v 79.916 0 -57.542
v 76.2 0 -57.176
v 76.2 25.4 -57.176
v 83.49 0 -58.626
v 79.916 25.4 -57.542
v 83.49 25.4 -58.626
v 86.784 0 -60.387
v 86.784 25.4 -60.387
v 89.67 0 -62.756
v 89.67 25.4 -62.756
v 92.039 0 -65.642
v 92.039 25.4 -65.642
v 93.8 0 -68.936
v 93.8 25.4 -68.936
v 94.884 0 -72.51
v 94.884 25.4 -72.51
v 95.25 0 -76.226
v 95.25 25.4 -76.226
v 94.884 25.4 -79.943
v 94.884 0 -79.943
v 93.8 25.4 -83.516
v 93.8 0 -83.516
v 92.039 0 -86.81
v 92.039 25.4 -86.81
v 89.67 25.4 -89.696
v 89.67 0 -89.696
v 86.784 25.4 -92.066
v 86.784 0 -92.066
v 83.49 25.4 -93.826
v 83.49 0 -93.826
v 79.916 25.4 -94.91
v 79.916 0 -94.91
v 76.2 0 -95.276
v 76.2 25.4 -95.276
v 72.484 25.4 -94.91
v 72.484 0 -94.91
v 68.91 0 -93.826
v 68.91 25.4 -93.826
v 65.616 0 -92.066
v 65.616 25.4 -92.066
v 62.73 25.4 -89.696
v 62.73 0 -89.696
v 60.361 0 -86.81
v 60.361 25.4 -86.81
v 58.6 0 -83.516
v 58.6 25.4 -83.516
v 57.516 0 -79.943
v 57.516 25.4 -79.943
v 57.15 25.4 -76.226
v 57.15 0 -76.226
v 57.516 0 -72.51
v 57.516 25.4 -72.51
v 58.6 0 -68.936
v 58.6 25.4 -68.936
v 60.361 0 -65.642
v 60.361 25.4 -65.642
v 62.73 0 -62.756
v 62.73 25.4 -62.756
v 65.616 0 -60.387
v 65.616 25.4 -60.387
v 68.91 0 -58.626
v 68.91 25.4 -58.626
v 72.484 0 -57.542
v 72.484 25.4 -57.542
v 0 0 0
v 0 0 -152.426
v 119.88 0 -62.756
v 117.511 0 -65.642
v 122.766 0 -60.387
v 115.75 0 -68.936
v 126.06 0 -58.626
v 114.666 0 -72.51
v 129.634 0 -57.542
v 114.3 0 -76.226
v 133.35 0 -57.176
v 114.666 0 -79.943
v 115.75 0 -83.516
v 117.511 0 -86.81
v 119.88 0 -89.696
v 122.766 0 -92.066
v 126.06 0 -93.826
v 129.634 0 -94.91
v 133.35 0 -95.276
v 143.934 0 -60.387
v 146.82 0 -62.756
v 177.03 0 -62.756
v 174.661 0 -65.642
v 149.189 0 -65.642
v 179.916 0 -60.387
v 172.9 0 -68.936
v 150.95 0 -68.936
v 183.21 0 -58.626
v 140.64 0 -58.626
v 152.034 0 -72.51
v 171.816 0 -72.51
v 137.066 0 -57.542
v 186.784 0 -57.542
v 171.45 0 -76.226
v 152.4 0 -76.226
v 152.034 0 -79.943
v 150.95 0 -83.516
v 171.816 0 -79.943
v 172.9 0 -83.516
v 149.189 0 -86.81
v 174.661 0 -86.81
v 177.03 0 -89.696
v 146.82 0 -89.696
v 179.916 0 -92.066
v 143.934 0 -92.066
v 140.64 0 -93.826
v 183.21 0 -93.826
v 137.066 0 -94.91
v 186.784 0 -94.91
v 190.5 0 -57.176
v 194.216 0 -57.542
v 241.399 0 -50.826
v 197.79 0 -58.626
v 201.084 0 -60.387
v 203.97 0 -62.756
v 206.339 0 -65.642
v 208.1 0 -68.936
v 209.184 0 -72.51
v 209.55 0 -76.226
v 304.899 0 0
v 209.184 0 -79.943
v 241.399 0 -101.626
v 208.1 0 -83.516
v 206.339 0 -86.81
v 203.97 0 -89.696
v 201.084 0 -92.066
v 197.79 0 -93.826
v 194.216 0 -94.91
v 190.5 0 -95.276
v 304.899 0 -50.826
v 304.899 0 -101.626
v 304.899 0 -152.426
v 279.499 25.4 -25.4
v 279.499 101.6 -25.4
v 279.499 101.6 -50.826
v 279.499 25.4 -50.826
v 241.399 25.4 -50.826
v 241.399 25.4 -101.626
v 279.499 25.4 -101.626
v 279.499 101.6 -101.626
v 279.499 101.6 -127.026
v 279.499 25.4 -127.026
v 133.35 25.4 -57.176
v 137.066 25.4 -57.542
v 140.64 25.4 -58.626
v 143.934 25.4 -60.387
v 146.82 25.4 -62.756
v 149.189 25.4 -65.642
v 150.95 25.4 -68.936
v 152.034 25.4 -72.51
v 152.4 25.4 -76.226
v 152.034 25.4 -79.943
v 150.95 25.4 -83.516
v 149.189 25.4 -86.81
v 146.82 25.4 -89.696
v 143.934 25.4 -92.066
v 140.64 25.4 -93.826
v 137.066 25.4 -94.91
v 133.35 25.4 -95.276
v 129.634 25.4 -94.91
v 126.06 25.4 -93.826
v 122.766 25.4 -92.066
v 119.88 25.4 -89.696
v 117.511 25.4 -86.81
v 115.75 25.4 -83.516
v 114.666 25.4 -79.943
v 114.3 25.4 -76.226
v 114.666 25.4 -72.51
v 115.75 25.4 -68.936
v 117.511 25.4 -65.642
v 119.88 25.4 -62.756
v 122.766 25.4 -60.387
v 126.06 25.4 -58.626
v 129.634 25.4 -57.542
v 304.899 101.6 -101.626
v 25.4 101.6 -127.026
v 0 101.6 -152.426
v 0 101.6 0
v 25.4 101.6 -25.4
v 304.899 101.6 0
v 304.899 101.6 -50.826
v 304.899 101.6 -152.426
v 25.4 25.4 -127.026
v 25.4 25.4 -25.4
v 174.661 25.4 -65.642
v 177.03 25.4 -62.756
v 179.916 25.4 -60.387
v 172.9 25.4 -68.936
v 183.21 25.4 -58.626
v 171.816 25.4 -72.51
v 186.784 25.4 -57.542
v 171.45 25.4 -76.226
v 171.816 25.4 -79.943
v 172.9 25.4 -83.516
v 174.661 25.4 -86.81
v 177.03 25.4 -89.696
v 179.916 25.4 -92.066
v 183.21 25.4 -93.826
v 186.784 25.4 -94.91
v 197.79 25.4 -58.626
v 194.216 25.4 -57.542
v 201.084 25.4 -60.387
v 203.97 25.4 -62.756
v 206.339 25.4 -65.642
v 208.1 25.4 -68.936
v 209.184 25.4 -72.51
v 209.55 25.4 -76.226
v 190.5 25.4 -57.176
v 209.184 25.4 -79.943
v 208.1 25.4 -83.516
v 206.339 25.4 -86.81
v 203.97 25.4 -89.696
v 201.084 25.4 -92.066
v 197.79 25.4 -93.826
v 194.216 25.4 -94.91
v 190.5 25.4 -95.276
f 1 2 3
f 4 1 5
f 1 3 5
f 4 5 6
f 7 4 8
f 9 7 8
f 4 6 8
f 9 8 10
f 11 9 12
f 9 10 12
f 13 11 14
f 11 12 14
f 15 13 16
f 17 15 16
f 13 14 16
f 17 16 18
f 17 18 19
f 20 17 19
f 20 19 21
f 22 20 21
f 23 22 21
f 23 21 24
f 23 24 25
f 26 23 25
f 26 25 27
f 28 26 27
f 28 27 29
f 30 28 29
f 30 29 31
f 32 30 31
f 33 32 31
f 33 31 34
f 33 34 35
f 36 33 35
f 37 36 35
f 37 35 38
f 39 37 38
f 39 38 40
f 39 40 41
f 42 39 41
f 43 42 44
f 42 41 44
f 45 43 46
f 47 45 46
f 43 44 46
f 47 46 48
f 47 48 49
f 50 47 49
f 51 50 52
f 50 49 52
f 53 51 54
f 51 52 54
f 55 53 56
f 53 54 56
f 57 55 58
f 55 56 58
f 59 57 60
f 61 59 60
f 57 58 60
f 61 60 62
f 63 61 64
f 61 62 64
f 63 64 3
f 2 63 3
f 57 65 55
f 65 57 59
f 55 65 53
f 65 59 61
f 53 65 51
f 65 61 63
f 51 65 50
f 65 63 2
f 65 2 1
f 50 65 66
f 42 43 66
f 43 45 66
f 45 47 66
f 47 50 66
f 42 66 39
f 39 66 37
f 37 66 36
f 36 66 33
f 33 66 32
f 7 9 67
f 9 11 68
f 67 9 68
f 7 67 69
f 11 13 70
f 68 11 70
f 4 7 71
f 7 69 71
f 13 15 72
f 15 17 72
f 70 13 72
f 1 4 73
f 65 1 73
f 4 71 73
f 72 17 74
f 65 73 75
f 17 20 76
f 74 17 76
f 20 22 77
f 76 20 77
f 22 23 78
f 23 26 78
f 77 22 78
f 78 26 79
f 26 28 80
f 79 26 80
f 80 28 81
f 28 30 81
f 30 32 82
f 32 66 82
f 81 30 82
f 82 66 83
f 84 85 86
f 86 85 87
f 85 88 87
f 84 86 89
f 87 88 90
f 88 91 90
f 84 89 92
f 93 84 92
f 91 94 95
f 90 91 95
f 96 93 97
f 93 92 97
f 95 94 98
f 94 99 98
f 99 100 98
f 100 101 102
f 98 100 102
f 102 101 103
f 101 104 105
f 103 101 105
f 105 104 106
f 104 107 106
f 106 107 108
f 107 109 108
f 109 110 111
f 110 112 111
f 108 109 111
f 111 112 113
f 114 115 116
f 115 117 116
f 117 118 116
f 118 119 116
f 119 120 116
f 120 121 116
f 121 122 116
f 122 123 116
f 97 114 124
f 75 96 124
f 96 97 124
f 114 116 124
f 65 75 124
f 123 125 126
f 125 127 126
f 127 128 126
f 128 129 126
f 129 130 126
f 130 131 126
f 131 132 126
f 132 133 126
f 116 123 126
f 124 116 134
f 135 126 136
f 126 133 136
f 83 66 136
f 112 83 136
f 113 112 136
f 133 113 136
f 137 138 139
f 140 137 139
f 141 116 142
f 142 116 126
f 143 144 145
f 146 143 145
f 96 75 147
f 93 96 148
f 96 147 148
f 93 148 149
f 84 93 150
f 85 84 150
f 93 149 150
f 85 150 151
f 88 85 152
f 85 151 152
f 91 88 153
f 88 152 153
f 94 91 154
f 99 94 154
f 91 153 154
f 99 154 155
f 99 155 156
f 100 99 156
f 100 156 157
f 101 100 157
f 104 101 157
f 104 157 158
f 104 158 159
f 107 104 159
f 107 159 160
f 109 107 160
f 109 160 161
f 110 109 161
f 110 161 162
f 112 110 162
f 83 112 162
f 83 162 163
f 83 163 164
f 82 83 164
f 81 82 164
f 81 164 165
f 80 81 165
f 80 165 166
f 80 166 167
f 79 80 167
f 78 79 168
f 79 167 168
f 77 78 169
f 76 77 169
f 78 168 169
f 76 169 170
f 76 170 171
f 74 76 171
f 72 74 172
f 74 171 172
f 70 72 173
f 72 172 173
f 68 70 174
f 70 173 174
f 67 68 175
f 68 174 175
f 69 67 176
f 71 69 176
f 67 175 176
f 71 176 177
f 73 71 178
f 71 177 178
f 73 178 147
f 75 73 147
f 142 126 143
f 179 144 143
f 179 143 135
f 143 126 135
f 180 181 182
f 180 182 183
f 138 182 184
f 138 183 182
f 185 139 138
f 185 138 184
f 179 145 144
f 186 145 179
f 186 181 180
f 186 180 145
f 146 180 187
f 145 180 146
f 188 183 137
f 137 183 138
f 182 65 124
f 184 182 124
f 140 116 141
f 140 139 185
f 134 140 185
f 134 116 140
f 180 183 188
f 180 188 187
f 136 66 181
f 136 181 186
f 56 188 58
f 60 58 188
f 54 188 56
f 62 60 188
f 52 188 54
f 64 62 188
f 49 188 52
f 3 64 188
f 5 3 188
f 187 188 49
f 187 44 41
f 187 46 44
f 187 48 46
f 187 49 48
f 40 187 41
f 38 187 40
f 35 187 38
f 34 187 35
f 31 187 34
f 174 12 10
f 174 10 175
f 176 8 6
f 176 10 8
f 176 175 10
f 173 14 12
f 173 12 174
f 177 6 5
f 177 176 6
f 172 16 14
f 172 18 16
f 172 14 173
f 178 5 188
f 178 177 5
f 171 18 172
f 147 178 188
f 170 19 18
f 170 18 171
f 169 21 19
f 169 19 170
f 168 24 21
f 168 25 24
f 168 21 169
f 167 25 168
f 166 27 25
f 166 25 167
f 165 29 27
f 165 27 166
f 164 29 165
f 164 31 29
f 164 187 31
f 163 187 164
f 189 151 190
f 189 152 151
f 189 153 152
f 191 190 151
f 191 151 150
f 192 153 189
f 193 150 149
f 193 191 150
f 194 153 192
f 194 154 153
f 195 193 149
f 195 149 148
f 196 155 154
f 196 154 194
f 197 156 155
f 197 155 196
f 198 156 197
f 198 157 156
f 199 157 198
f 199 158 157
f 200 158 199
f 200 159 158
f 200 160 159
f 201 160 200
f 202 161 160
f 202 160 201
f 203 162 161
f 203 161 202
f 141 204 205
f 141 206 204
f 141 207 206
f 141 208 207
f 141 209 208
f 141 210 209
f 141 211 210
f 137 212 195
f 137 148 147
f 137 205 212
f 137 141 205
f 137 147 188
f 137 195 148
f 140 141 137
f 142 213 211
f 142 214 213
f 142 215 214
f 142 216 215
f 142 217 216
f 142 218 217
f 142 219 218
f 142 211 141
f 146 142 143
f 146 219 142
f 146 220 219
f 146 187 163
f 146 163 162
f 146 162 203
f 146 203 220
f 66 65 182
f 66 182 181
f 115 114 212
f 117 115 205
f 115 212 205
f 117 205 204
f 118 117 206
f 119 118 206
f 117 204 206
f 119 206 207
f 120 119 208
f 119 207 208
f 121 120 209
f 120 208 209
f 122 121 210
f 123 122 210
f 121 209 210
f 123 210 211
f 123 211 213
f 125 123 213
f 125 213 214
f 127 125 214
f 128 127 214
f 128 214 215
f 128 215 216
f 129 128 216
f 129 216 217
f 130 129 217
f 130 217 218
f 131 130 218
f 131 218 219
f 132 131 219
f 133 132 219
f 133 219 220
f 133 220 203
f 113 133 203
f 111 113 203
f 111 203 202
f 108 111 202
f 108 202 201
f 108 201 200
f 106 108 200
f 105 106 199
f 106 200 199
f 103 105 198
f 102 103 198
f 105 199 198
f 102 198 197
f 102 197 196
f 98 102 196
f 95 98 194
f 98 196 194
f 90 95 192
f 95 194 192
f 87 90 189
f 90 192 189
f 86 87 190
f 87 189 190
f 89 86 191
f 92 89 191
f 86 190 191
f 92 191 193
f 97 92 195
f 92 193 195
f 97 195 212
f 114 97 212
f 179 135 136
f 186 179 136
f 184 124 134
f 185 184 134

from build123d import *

# Parameters (mm, degrees)
SKETCH3_W           = 304.898736347
SKETCH3_H           = 152.426093062
BOSS_EXTRUDE1_DEPTH = 101.6
SKETCH4_W           = 63.5
SKETCH4_H           = 50.8
CUT_EXTRUDE1_DEPTH  = 147.32
SKETCH5_W           = 254.098736347
SKETCH5_H           = 101.626093062
SKETCH5_R           = 19.05
CUT_EXTRUDE2_DEPTH  = 76.2
CUT_EXTRUDE3_START  = 138.938
SKETCH7_R           = 19.05
CUT_EXTRUDE3_DEPTH  = 138.938


with BuildPart() as part:
    # Sketch3 → Boss-Extrude1 (new body)
    with BuildSketch(Plane(origin=(0, 0, 0), x_dir=(1, 0, 0), z_dir=(0, 1, 0))):
        with Locations((152.449368174, 76.213046531)):
            Rectangle(SKETCH3_W, SKETCH3_H)
    extrude(amount=BOSS_EXTRUDE1_DEPTH)

    # Sketch4 → Cut-Extrude1 (cut)
    with BuildSketch(Plane(origin=(0, 0, 0), x_dir=(1, 0, 0), z_dir=(0, 1, 0))):
        with Locations((273.148736347, 76.226093062)):
            Rectangle(SKETCH4_W, SKETCH4_H)
    extrude(amount=CUT_EXTRUDE1_DEPTH, mode=Mode.SUBTRACT)

    # Sketch5 → Cut-Extrude2 (cut)
    with BuildSketch(Plane(origin=(0, 101.6, 0), x_dir=(1, 0, 0), z_dir=(0, 1, 0))):
        with Locations((152.449368174, 76.213046531)):
            Rectangle(SKETCH5_W, SKETCH5_H)
        with Locations(Location((76.2, 76.226093062, 0), (0, 0, 270))):
            Circle(SKETCH5_R, mode=Mode.SUBTRACT)
        with Locations(Location((133.35, 76.226093062, 0), (0, 0, 270))):
            Circle(SKETCH5_R, mode=Mode.SUBTRACT)
        with Locations(Location((190.5, 76.226093062, 0), (0, 0, 270))):
            Circle(SKETCH5_R, mode=Mode.SUBTRACT)
    extrude(amount=-CUT_EXTRUDE2_DEPTH, mode=Mode.SUBTRACT)

    # Sketch7 → Cut-Extrude3 (cut)
    with BuildSketch(Plane(origin=(0, 0, 0), x_dir=(1, 0, 0), z_dir=(0, 1, 0)).offset(CUT_EXTRUDE3_START)):
        with Locations(Location((76.2, 76.226093062, 0), (0, 0, 270))):
            Circle(SKETCH7_R)
        with Locations(Location((133.35, 76.226093062, 0), (0, 0, 270))):
            Circle(SKETCH7_R)
        with Locations(Location((190.5, 76.226093062, 0), (0, 0, 270))):
            Circle(SKETCH7_R)
    extrude(amount=-CUT_EXTRUDE3_DEPTH, mode=Mode.SUBTRACT)


solid = part.part
